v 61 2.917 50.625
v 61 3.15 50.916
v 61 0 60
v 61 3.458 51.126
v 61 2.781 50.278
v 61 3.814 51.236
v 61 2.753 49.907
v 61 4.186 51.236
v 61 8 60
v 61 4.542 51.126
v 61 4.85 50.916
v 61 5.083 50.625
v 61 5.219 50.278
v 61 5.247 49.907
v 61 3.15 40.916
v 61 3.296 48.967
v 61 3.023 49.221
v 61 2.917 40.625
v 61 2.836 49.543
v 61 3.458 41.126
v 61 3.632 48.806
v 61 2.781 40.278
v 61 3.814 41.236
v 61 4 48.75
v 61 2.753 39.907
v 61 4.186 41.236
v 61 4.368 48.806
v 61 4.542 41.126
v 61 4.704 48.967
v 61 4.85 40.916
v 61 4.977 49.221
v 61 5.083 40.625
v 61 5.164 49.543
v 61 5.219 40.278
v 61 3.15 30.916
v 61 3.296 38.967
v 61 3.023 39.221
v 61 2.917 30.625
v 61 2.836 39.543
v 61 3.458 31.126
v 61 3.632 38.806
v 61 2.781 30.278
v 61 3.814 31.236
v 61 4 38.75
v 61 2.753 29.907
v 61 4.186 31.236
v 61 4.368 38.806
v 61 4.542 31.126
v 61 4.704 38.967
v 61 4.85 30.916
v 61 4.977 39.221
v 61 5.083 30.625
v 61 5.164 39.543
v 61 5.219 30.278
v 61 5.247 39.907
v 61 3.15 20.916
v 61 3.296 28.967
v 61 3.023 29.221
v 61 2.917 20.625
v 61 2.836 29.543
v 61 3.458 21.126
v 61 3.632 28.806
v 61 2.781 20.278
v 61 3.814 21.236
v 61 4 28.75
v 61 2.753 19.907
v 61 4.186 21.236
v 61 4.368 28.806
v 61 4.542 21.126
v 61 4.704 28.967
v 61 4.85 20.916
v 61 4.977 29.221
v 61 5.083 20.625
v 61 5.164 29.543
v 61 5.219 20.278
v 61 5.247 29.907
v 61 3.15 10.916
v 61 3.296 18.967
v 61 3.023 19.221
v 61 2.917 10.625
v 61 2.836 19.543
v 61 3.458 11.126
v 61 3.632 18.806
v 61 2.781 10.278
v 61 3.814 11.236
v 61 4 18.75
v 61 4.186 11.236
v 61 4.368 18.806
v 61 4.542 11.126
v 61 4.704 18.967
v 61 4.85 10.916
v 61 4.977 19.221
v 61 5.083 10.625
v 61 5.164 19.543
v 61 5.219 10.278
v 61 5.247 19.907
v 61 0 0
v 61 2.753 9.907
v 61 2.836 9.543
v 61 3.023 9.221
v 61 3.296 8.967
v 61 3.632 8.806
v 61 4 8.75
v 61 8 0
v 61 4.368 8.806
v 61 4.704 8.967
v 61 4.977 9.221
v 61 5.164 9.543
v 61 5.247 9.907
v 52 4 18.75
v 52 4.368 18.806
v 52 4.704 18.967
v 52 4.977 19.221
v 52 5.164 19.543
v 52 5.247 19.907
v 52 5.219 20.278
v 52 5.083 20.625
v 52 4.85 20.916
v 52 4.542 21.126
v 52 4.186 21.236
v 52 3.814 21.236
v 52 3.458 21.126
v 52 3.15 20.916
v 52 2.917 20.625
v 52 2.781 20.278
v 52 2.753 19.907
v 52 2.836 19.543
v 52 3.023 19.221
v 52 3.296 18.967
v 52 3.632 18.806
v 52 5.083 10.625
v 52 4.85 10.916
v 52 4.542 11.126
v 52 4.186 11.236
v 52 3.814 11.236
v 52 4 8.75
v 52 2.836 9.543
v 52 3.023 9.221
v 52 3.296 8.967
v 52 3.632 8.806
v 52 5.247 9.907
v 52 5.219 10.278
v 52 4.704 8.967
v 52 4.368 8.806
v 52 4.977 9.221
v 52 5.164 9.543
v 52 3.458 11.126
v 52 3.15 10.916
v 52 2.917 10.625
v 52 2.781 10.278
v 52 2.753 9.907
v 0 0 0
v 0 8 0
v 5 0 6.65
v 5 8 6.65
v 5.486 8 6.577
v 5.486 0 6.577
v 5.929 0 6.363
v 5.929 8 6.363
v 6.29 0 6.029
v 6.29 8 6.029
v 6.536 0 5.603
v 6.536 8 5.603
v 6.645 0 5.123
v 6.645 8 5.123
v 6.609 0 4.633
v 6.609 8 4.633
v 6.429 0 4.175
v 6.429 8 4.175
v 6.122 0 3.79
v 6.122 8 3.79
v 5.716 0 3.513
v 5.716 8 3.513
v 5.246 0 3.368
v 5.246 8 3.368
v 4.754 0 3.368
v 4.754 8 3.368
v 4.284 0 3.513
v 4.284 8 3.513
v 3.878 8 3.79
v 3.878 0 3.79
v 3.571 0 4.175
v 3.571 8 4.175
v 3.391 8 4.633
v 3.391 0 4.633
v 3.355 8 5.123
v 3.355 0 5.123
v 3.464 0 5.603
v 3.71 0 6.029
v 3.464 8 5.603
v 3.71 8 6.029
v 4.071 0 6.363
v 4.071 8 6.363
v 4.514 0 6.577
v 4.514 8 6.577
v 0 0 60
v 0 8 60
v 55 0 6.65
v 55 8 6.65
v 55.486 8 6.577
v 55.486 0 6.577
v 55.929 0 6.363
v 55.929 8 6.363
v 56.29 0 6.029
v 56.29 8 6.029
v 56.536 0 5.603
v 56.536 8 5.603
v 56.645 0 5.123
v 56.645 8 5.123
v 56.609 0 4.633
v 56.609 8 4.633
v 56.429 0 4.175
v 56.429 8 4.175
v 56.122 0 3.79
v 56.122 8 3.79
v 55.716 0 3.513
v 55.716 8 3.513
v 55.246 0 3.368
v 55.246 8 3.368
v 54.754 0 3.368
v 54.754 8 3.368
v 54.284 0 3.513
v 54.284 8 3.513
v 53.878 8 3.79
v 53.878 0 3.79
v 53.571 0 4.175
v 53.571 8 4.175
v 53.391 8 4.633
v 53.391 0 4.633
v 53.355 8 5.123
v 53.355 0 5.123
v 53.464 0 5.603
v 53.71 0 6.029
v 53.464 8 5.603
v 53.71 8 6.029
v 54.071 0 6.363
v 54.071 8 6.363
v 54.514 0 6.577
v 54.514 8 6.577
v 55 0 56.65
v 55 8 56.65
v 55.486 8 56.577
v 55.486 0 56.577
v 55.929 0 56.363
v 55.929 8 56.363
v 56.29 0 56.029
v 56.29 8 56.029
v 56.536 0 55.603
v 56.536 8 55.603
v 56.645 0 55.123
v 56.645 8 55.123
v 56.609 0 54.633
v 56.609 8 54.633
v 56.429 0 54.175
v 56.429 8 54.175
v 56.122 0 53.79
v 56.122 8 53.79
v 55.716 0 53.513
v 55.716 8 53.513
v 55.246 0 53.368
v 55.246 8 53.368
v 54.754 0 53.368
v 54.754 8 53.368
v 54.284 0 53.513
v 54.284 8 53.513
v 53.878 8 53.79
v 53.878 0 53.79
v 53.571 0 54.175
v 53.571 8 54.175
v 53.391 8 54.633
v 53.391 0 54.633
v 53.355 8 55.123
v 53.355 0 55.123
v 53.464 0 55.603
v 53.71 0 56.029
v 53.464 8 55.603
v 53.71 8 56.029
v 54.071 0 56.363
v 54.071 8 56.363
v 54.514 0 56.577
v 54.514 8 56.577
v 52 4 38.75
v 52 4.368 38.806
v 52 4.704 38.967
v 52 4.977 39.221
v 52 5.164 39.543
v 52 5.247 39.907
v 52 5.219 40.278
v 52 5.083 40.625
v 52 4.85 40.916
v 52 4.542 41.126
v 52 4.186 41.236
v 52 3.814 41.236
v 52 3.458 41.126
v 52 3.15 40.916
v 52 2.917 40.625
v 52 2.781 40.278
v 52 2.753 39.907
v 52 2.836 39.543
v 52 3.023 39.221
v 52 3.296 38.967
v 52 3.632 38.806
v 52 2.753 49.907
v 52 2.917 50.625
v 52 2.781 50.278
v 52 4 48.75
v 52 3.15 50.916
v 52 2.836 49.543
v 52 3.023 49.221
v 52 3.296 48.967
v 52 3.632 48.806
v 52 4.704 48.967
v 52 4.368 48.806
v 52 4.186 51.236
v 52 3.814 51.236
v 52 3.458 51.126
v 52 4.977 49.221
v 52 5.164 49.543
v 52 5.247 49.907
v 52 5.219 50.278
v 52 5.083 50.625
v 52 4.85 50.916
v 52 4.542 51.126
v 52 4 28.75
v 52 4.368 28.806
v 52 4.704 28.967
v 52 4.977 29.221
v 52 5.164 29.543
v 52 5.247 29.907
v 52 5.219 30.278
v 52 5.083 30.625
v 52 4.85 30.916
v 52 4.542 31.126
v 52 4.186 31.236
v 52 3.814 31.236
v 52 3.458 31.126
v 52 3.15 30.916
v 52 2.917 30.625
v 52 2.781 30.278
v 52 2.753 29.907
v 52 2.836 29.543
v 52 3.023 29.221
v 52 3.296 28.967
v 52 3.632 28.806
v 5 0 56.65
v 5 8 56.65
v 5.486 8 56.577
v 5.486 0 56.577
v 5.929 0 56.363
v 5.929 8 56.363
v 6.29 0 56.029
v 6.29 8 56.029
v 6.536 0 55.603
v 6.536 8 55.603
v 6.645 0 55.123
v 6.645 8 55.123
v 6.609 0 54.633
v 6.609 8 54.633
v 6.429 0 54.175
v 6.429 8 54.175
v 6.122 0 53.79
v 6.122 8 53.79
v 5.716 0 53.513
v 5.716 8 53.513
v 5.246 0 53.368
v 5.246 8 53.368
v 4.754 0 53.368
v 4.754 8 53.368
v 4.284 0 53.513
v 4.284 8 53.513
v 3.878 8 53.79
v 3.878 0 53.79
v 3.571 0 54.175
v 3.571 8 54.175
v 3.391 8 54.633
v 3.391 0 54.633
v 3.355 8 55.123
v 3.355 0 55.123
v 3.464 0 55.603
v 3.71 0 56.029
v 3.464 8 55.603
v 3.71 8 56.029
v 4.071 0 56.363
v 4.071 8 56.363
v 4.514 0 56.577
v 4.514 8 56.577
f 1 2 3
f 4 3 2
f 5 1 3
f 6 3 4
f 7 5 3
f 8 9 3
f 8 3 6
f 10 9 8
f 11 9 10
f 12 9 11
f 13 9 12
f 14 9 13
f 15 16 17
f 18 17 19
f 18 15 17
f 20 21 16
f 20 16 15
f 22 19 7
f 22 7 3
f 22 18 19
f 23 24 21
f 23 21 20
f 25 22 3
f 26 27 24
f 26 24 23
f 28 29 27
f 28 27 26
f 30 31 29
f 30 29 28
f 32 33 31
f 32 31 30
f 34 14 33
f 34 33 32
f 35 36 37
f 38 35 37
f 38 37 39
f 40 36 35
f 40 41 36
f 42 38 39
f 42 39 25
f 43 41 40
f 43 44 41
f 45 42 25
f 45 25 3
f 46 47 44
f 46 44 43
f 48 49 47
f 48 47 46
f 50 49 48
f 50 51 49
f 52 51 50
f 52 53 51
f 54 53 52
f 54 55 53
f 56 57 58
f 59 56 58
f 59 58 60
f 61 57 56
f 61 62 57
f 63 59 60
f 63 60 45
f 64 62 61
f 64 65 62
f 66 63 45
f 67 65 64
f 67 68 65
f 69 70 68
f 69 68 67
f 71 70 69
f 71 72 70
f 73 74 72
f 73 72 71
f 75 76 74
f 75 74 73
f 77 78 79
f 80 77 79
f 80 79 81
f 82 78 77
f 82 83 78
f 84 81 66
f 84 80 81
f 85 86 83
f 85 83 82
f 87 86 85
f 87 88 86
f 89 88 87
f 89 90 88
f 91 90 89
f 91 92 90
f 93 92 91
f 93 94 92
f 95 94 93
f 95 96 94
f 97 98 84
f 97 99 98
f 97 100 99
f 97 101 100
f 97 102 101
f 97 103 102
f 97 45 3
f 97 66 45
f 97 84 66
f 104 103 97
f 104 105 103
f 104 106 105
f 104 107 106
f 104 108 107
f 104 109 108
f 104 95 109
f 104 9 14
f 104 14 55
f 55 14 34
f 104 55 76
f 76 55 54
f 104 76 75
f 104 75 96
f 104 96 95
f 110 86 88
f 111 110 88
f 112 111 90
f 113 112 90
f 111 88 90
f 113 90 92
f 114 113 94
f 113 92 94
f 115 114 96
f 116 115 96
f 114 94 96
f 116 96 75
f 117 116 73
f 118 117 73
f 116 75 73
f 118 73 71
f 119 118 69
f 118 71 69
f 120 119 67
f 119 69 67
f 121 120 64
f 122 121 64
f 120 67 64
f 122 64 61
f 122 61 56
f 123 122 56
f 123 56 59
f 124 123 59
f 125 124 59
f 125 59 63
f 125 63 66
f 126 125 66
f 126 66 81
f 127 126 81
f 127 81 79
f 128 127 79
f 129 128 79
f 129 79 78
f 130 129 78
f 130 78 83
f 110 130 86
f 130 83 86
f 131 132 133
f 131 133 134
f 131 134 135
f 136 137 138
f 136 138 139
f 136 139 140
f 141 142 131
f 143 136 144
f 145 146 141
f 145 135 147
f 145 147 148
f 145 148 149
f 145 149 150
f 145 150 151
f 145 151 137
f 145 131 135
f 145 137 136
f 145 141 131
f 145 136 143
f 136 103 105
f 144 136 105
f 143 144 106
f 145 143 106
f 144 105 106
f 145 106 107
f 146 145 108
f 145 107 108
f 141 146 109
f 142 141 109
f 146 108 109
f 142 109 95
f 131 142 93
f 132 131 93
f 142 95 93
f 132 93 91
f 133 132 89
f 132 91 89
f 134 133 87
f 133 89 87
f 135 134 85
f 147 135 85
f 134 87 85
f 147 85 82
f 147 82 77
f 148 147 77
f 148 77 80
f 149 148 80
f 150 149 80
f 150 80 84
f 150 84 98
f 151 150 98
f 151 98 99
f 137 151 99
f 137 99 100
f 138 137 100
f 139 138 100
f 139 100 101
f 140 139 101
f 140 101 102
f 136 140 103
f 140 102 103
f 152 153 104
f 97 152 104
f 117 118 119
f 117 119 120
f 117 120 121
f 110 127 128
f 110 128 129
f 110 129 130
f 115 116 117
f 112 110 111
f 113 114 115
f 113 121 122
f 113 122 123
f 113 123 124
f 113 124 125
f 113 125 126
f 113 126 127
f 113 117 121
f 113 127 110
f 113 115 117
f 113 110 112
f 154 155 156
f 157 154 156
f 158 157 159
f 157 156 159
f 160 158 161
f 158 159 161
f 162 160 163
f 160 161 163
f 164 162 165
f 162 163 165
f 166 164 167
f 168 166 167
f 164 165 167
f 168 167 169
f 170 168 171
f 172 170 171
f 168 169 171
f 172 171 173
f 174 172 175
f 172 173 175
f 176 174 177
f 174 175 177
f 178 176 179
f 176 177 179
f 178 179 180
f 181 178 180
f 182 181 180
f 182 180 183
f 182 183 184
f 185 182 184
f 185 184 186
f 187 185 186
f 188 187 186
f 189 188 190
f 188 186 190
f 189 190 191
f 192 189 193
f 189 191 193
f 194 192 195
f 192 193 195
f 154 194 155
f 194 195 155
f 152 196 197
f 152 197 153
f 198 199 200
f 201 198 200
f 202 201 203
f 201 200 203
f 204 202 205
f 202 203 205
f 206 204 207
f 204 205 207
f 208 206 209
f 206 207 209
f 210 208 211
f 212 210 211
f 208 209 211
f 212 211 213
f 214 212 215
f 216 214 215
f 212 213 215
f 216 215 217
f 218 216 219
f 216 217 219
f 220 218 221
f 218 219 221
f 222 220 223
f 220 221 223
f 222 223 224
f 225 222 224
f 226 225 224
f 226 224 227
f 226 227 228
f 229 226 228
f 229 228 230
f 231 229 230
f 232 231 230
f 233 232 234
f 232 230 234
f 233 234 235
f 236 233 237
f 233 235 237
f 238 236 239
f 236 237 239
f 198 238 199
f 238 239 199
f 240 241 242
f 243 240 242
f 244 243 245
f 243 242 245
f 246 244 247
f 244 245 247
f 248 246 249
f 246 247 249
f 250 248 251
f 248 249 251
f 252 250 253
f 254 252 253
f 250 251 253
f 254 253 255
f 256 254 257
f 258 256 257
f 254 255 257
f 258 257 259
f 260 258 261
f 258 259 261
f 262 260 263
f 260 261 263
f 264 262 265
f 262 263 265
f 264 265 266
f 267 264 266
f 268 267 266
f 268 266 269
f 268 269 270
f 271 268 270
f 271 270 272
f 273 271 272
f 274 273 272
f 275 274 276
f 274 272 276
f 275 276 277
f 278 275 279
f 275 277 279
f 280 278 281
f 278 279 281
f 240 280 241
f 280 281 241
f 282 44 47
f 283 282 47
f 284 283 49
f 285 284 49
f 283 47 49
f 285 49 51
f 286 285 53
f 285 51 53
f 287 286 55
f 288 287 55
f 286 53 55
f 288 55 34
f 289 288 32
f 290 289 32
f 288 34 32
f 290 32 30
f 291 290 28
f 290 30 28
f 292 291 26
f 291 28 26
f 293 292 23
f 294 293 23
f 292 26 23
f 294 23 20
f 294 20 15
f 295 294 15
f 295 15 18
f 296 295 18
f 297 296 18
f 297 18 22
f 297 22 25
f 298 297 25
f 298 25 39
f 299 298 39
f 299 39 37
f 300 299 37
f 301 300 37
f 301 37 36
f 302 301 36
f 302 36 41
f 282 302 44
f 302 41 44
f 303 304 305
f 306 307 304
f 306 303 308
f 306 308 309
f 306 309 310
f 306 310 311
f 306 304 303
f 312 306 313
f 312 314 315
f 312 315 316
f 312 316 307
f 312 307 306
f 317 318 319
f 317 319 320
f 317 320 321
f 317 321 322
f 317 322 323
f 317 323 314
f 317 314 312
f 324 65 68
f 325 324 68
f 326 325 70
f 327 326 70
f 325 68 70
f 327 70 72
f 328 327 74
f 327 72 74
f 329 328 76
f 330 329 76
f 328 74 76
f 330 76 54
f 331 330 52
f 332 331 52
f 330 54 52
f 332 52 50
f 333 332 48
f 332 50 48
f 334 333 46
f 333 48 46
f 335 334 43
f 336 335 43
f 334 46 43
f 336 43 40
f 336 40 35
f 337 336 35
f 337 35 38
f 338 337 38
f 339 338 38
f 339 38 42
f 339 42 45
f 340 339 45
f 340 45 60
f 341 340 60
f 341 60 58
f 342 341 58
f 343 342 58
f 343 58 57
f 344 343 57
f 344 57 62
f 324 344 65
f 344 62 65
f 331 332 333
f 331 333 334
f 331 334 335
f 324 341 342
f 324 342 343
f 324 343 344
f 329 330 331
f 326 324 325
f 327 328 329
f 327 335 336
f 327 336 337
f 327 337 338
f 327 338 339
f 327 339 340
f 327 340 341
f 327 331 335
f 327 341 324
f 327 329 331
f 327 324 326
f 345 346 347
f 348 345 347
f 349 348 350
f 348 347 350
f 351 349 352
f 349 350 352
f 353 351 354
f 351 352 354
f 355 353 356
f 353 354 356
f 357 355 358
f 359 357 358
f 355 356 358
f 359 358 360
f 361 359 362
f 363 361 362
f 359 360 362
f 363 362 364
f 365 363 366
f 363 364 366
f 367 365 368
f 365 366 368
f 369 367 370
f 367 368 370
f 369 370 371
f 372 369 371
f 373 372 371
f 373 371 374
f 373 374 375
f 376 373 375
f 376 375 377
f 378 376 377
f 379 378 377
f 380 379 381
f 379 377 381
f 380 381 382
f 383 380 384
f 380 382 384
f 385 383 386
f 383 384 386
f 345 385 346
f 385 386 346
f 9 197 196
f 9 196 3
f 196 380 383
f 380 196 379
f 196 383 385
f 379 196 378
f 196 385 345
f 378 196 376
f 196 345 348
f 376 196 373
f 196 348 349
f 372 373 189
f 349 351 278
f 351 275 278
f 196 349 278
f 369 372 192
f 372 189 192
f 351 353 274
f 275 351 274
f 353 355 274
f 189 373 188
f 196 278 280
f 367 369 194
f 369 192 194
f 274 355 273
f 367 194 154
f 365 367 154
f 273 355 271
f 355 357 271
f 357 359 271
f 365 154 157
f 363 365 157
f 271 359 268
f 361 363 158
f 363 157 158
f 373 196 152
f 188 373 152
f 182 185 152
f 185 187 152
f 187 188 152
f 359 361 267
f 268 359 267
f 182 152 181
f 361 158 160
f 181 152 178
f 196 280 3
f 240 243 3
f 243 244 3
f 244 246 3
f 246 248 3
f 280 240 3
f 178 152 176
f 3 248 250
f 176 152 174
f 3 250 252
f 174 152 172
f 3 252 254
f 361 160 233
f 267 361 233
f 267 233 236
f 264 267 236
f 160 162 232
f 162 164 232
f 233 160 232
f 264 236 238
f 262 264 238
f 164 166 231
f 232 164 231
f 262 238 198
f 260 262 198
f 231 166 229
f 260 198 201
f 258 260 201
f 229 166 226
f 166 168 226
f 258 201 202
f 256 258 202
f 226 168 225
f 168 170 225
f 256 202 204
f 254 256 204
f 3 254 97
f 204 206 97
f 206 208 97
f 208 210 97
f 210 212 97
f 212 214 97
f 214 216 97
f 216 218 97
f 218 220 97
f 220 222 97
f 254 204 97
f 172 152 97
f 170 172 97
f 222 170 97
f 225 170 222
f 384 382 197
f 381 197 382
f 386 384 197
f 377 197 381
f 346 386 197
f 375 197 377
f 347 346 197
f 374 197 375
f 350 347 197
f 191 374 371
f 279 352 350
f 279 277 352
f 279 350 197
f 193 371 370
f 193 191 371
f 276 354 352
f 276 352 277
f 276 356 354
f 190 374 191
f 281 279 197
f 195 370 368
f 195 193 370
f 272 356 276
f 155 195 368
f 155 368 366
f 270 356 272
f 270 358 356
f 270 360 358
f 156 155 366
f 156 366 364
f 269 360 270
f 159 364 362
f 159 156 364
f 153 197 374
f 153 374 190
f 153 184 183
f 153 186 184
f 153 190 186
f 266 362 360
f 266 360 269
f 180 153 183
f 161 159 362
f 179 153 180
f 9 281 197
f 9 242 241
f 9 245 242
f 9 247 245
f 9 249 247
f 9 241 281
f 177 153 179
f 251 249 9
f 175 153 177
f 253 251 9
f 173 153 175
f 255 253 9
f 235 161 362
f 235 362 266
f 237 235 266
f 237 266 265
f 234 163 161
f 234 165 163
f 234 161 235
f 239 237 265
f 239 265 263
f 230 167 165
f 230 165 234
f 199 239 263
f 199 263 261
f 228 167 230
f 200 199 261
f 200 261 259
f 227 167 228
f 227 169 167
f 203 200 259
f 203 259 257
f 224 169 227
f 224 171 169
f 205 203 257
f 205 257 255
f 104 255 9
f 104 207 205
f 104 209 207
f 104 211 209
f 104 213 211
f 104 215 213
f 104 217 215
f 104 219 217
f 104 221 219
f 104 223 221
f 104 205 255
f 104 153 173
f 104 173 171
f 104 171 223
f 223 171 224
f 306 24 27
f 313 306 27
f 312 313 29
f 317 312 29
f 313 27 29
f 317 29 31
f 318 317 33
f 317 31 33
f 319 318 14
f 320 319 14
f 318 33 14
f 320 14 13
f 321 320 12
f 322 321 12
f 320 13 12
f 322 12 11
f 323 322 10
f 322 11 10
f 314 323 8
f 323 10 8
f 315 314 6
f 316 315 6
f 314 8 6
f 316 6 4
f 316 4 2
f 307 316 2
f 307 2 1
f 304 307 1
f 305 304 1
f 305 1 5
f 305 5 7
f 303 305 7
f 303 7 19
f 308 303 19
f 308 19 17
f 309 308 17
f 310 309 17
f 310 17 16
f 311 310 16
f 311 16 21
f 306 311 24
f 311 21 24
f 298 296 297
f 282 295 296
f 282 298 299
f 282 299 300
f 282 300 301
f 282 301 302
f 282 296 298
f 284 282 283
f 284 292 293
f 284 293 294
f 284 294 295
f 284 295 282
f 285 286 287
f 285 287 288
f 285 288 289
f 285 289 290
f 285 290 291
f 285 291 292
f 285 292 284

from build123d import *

# Parameters (mm, degrees)
SKETCH_1_W          = 60
SKETCH_1_H          = 60
EXTRUDE_1_DEPTH     = 8
SKETCH_2_R          = 1.65
CUT_EXTRUDE_1_DEPTH = 8
SKETCH_3_W          = 1
SKETCH_3_H          = 60
EXTRUDE_2_DEPTH     = 8
SKETCH_7_R          = 1.25
CUT_EXTRUDE_2_DEPTH = 9


with BuildPart() as part:
    # 草图1 → 凸台-拉伸1 (new body)
    with BuildSketch(Plane(origin=(0, 0, 0), x_dir=(1, 0, 0), z_dir=(0, 1, 0))):
        with Locations((30, -30)):
            Rectangle(SKETCH_1_W, SKETCH_1_H)
    extrude(amount=EXTRUDE_1_DEPTH)

    # 草图2 → 切除-拉伸1 (cut)
    with BuildSketch(Plane(origin=(0, 8, 0), x_dir=(1, 0, 0), z_dir=(0, 1, 0))):
        with Locations(Location((5, -5, 0), (0, 0, 270))):
            Circle(SKETCH_2_R)
        with Locations(Location((55, -5, 0), (0, 0, 270))):
            Circle(SKETCH_2_R)
        with Locations(Location((5, -55, 0), (0, 0, 270))):
            Circle(SKETCH_2_R)
        with Locations(Location((55, -55, 0), (0, 0, 270))):
            Circle(SKETCH_2_R)
    extrude(amount=-CUT_EXTRUDE_1_DEPTH, mode=Mode.SUBTRACT)

    # 草图3 → 凸台-拉伸2 (add)
    with BuildSketch(Plane(origin=(0, 8, 0), x_dir=(1, 0, 0), z_dir=(0, 1, 0))):
        with Locations((60.5, -30)):
            Rectangle(SKETCH_3_W, SKETCH_3_H)
    extrude(amount=-EXTRUDE_2_DEPTH)

    # 草图7 → 切除-拉伸2 (cut)
    with BuildSketch(Plane(origin=(61, 0, 0), x_dir=(0, 0, -1), z_dir=(1, 0, 0))):
        with Locations((-50, 4)):
            Circle(SKETCH_7_R)
        with Locations((-40, 4)):
            Circle(SKETCH_7_R)
        with Locations((-30, 4)):
            Circle(SKETCH_7_R)
        with Locations((-10, 4)):
            Circle(SKETCH_7_R)
        with Locations((-20, 4)):
            Circle(SKETCH_7_R)
    extrude(amount=-CUT_EXTRUDE_2_DEPTH, mode=Mode.SUBTRACT)


solid = part.part
